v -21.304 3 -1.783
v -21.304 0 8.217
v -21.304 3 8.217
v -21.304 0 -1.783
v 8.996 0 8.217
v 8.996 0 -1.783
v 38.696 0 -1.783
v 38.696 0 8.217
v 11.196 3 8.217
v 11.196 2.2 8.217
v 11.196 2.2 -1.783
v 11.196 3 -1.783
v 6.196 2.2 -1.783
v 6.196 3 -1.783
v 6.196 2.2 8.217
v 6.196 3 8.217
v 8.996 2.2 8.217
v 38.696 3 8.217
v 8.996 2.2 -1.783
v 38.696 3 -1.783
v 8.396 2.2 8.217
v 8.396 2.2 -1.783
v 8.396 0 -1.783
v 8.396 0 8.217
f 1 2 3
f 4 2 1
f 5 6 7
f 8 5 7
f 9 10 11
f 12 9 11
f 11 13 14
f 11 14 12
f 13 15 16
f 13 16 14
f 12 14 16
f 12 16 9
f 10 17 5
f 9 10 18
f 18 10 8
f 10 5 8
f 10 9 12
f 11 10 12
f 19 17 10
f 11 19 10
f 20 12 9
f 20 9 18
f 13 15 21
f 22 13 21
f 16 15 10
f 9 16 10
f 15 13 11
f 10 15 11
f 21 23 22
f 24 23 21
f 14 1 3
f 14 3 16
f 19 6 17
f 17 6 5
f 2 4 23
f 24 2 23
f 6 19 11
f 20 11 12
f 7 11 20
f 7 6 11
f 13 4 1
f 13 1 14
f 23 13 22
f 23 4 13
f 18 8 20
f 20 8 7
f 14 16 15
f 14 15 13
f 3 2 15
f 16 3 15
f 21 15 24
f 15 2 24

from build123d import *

# Parameters (mm, degrees)
SKETCH1_W           = 60
SKETCH1_H           = 10
BOSS_EXTRUDE1_DEPTH = 3
SKETCH3_W           = 0.6
SKETCH3_H           = 10
CUT_EXTRUDE1_DEPTH  = 2.2
SKETCH4_W           = 5
SKETCH4_H           = 10
CUT_EXTRUDE2_DEPTH  = 0.8
SKETCH5_W           = 5
SKETCH5_H           = 10
BOSS_EXTRUDE2_DEPTH = 0.8


with BuildPart() as part:
    # Sketch1 → Boss-Extrude1 (new body)
    with BuildSketch(Plane(origin=(0, 0, 0), x_dir=(1, 0, 0), z_dir=(0, 1, 0))):
        with Locations((8.695652174, -3.217391304)):
            Rectangle(SKETCH1_W, SKETCH1_H)
    extrude(amount=BOSS_EXTRUDE1_DEPTH)

    # Sketch3 → Cut-Extrude1 (cut)
    with BuildSketch(Plane.XZ):
        with Locations((8.695652174, 3.217391304)):
            Rectangle(SKETCH3_W, SKETCH3_H)
    extrude(amount=-CUT_EXTRUDE1_DEPTH, mode=Mode.SUBTRACT)

    # Sketch4 → Cut-Extrude2 (cut)
    with BuildSketch(Plane(origin=(0, 3, 0), x_dir=(1, 0, 0), z_dir=(0, 1, 0))):
        with Locations((8.695652174, -3.217391304)):
            Rectangle(SKETCH4_W, SKETCH4_H)
    extrude(amount=-CUT_EXTRUDE2_DEPTH, mode=Mode.SUBTRACT)


with BuildPart() as cut_extrude2_piece_1:
    # of the separate pieces the step leaves, piece 1, a body of its own (cut_extrude2_pieces)
    add(part.part.solids().sort_by_distance((-21.304347826, 0, 8.217391304))[0])


with BuildPart() as cut_extrude2_piece_2:
    # of the separate pieces the step leaves, piece 2, a body of its own (cut_extrude2_pieces)
    add(part.part.solids().sort_by_distance((8.995652174, 0, 8.217391304))[0])


with BuildPart() as body_3:
    # Sketch5 → Boss-Extrude2 (new body)
    with BuildSketch(Plane(origin=(0, 2.2, 0), x_dir=(1, 0, 0), z_dir=(0, 1, 0))):
        with Locations((8.695652174, -3.217391304)):
            Rectangle(SKETCH5_W, SKETCH5_H)
    extrude(amount=BOSS_EXTRUDE2_DEPTH)


solid = Compound([cut_extrude2_piece_1.part, cut_extrude2_piece_2.part, body_3.part])
